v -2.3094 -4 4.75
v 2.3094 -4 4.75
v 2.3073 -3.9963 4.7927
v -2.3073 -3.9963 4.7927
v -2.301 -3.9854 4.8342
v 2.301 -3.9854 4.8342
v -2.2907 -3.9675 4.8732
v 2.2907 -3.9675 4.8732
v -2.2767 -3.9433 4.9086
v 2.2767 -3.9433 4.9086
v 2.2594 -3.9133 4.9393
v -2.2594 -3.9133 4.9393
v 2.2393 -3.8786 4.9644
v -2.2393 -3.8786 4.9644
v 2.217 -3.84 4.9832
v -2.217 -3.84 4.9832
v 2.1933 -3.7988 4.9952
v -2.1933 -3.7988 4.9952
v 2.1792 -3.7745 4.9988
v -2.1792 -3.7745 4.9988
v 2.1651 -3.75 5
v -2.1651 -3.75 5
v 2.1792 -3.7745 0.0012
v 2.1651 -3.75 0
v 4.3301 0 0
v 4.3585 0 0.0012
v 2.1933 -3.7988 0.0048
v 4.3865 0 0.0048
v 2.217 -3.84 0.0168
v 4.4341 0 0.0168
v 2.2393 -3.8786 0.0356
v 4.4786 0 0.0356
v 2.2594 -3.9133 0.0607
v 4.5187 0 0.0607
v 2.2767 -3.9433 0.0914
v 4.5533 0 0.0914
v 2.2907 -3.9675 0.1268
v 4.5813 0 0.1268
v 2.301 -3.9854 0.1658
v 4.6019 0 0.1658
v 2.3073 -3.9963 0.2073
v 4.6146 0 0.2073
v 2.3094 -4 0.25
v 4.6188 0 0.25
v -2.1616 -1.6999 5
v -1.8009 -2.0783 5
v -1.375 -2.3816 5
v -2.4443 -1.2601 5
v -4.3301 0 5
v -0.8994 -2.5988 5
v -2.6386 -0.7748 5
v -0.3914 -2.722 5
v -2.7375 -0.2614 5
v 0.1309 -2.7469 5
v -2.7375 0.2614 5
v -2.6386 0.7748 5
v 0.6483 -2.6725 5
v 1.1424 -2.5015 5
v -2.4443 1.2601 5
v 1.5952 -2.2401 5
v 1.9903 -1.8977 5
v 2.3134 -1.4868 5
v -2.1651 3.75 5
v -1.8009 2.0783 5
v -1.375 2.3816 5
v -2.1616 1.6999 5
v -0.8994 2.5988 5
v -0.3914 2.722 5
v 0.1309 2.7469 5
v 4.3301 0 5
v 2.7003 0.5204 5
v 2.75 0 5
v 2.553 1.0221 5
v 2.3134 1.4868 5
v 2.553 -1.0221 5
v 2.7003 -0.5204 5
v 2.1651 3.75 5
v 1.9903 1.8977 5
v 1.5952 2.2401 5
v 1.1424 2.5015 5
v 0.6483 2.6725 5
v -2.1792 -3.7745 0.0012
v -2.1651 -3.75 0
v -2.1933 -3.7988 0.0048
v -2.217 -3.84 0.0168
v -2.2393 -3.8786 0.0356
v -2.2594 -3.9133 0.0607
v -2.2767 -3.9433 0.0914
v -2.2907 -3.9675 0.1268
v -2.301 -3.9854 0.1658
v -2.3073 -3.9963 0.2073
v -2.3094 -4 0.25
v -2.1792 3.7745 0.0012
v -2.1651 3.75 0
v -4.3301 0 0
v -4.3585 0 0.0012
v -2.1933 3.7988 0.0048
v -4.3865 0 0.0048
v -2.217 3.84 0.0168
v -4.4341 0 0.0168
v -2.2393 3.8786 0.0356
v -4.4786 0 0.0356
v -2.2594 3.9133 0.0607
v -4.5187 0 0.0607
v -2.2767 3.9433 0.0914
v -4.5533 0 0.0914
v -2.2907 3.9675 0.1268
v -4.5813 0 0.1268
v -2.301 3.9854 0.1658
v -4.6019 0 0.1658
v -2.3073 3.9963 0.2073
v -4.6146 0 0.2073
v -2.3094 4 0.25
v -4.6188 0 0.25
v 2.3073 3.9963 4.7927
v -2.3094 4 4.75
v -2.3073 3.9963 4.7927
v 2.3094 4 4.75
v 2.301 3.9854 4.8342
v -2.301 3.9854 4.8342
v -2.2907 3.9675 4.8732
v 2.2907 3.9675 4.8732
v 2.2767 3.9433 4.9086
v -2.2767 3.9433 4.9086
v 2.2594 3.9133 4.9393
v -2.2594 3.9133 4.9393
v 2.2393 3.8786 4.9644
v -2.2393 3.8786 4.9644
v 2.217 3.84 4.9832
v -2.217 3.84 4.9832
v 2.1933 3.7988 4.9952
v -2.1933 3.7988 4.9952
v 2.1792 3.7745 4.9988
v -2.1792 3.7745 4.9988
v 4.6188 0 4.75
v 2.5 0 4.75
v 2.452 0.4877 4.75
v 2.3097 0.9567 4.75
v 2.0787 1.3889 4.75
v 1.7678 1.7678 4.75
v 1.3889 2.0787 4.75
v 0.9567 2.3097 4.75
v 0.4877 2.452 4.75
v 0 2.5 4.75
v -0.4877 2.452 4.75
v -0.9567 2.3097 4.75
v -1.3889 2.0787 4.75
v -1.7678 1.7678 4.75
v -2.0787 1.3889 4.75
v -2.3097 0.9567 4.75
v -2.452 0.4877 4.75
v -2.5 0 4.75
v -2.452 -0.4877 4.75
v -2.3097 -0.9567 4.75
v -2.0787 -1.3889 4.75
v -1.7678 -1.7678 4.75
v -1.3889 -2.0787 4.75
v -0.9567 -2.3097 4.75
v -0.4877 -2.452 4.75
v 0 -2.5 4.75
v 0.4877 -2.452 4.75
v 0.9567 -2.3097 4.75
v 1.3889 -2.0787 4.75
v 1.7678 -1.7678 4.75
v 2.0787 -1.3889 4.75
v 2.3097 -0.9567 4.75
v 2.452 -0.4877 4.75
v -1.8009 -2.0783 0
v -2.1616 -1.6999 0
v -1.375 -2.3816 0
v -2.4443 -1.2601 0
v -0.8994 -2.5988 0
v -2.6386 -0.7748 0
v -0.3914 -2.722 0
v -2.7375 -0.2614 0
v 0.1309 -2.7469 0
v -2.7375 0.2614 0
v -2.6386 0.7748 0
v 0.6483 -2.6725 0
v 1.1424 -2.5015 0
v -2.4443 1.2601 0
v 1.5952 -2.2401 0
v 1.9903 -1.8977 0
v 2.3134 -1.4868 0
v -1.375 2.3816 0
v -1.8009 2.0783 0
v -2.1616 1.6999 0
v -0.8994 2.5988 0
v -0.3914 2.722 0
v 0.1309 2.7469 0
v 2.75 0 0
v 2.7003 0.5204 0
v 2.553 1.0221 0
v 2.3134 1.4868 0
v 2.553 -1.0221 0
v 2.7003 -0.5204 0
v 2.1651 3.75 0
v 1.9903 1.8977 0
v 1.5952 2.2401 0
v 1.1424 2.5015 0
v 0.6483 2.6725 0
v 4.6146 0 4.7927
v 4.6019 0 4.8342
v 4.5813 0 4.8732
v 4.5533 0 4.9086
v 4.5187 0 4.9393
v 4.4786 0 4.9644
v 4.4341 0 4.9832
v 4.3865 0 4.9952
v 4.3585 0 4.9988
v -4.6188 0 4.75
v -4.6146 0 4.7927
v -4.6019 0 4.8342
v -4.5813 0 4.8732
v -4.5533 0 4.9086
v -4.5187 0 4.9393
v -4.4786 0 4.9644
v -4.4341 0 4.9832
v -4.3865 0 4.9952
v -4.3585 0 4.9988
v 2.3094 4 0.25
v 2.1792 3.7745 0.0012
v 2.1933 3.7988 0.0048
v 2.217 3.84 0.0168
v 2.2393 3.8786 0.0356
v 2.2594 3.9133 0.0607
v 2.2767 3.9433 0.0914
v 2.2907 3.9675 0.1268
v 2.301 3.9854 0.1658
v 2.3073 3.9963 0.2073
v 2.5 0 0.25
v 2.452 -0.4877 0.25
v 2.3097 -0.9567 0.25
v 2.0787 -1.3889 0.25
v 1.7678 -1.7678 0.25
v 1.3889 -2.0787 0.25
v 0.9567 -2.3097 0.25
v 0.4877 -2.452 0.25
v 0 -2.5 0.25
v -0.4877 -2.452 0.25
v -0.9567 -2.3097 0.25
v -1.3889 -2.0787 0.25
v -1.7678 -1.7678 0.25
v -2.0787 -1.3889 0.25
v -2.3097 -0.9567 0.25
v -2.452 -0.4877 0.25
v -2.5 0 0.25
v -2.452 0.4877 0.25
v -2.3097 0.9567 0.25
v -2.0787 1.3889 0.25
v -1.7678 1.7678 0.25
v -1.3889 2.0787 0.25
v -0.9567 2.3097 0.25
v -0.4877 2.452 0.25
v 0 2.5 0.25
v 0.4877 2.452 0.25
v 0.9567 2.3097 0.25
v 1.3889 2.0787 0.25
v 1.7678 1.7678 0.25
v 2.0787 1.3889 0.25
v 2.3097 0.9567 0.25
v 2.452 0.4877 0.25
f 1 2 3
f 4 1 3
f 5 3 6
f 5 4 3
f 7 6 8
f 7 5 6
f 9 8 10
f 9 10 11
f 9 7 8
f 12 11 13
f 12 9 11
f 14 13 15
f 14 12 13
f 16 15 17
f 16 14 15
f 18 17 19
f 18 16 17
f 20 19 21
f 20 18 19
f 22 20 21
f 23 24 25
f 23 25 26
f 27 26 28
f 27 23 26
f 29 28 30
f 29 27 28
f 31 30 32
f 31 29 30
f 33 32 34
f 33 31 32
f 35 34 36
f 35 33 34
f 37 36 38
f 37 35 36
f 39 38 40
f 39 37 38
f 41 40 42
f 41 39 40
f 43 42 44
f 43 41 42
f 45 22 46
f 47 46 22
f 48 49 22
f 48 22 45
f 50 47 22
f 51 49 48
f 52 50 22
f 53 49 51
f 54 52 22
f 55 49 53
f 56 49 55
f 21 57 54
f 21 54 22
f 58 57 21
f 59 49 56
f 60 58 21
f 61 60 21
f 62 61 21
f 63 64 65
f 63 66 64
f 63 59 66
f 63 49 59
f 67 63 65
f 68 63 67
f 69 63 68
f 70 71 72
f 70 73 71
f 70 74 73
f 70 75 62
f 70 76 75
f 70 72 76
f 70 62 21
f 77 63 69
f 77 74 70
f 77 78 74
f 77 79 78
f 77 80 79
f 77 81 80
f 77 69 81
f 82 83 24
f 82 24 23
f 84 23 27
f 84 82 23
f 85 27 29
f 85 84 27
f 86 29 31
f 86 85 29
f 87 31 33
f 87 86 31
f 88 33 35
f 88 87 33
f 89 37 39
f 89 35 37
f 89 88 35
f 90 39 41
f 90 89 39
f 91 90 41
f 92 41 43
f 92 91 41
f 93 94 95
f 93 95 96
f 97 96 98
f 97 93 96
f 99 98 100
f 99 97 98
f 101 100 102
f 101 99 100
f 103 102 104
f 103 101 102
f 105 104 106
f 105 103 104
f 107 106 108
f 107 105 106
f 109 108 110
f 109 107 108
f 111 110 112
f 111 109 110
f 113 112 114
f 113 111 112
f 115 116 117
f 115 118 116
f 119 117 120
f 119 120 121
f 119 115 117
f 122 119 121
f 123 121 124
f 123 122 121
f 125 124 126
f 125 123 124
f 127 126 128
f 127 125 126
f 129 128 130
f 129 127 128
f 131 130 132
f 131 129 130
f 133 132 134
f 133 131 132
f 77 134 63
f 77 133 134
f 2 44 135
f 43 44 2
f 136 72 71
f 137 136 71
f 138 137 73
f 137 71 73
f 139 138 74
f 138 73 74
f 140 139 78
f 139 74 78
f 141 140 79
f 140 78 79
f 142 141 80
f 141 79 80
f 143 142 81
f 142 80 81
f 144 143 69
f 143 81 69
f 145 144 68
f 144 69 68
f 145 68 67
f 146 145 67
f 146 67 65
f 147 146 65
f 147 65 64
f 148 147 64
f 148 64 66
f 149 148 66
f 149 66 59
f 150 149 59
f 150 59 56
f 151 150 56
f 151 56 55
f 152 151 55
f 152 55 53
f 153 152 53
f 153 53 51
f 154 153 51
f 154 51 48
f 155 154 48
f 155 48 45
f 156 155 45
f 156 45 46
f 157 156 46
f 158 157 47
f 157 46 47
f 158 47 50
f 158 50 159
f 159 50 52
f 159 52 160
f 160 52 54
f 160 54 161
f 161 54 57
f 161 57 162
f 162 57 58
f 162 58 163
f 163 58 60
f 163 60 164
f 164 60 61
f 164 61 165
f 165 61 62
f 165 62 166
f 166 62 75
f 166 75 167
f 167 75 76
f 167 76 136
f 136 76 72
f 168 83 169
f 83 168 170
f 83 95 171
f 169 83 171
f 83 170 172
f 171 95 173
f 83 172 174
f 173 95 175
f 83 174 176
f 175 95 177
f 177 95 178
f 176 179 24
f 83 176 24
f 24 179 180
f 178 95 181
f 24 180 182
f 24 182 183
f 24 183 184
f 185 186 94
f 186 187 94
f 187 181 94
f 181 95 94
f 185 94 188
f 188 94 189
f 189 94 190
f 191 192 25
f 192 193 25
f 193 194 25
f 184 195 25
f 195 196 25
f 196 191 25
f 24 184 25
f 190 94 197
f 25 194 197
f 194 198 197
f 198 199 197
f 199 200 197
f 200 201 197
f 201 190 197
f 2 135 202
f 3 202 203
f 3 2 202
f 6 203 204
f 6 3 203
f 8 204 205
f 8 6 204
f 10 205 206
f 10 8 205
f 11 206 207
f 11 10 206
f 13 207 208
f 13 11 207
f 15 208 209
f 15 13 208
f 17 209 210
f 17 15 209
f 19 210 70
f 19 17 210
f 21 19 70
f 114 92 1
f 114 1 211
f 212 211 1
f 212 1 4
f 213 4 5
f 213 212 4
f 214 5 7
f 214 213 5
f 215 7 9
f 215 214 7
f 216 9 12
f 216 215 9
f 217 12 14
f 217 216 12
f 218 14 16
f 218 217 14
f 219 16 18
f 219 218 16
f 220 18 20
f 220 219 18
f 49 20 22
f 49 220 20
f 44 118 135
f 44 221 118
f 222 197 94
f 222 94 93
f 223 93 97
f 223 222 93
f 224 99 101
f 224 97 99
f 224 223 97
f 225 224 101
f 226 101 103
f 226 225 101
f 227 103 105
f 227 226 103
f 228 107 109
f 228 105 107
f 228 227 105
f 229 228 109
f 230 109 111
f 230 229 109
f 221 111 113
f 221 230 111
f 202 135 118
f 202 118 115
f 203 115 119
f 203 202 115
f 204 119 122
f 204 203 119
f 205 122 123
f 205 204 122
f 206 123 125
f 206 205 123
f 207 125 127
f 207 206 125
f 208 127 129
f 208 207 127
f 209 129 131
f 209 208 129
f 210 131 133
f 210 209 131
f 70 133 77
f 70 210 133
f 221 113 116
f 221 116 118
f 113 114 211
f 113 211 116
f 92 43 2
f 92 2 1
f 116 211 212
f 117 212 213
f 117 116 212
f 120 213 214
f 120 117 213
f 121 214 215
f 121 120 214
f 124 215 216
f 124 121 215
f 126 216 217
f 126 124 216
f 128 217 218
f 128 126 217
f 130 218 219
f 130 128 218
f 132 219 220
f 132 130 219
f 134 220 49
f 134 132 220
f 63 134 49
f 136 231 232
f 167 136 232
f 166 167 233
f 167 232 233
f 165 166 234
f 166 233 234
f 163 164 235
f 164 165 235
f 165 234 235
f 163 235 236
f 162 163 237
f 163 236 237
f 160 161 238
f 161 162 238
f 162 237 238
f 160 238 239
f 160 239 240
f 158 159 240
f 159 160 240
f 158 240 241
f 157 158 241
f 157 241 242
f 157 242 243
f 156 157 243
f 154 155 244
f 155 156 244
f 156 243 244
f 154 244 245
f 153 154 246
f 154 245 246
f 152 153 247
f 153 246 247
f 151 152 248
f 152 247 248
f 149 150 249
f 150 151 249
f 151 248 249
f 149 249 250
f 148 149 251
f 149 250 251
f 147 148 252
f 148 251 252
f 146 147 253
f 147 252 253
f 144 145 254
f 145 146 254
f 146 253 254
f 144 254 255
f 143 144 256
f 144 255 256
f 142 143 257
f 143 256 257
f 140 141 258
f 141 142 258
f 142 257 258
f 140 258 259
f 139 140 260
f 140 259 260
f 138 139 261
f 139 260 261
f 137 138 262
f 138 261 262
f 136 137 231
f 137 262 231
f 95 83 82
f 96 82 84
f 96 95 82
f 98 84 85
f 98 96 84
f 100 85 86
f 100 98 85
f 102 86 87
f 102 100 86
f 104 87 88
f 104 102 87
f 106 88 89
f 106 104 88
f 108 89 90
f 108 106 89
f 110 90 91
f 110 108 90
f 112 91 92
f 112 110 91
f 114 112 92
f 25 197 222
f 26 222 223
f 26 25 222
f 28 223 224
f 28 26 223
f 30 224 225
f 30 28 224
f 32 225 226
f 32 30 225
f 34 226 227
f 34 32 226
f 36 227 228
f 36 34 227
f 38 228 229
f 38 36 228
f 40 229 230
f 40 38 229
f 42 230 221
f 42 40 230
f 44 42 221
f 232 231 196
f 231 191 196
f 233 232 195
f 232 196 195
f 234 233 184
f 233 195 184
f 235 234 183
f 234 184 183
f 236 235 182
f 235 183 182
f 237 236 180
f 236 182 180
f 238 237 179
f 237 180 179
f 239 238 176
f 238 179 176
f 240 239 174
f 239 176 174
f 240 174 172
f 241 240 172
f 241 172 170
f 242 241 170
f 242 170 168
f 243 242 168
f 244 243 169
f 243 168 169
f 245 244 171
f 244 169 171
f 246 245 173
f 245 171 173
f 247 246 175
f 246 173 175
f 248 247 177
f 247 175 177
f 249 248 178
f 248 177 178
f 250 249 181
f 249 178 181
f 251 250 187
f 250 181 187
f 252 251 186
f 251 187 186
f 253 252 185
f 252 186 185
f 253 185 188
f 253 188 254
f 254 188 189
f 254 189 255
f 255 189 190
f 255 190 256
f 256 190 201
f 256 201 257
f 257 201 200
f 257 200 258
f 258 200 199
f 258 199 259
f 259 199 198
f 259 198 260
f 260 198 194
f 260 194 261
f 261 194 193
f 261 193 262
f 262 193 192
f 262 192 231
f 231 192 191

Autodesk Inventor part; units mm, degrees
ref_plane "YZ Plane" through (0, 0, 0) normal (1, 0, 0) x (0, 1, 0)
ref_plane "XZ Plane" through (0, 0, 0) normal (0, 1, 0) x (-1, 0, 0)
ref_plane "XY Plane" through (0, 0, 0) normal (0, 0, 1) x (1, 0, 0)
sketch "草图1" plane through (0, 0, 0) normal (0, 0, 1) x (1, 0, 0)
  circle A0 centre (0, 0) radius 2.5
  line L0 (2.3094, -4) -> (-2.3094, -4)
  line L1 (-2.3094, -4) -> (-4.6188, 0)
  line L2 (-4.6188, 0) -> (-2.3094, 4)
  line L3 (-2.3094, 4) -> (2.3094, 4)
  line L4 (2.3094, 4) -> (4.6188, 0)
  line L5 (4.6188, 0) -> (2.3094, -4)
  line L6 (0, 0) -> (0, 1.5398)
  point P0 (0, 4)
  dimension "d0" = 5
  dimension "d1" = 1.5398
  dimension "d2" = 8
extrude "拉伸1" add sketch "草图1" along normal blind 5
thread "螺纹1" size "M5x0.8" class "6H" standard "ANSI Metric M Profile" full length
fillet "圆角1" radius 0.25 12 edges at (0, 4, 5) (3.4641, 2, 5) (3.4641, -2, 5) (-3.4641, -2, 5) (-3.4641, 2, 5) (0, -4, 5) (3.4641, -2, 0) (3.4641, 2, 0) (0, 4, 0) (-3.4641, 2, 0) (-3.4641, -2, 0) (0, -4, 0)
chamfer "倒角1" distance 0.25 angle 45 2 edges at (-2.5, 0, 5) (-2.5, 0, 0)
properties part number "砂轮架带动曲柄轴盖螺帽"
